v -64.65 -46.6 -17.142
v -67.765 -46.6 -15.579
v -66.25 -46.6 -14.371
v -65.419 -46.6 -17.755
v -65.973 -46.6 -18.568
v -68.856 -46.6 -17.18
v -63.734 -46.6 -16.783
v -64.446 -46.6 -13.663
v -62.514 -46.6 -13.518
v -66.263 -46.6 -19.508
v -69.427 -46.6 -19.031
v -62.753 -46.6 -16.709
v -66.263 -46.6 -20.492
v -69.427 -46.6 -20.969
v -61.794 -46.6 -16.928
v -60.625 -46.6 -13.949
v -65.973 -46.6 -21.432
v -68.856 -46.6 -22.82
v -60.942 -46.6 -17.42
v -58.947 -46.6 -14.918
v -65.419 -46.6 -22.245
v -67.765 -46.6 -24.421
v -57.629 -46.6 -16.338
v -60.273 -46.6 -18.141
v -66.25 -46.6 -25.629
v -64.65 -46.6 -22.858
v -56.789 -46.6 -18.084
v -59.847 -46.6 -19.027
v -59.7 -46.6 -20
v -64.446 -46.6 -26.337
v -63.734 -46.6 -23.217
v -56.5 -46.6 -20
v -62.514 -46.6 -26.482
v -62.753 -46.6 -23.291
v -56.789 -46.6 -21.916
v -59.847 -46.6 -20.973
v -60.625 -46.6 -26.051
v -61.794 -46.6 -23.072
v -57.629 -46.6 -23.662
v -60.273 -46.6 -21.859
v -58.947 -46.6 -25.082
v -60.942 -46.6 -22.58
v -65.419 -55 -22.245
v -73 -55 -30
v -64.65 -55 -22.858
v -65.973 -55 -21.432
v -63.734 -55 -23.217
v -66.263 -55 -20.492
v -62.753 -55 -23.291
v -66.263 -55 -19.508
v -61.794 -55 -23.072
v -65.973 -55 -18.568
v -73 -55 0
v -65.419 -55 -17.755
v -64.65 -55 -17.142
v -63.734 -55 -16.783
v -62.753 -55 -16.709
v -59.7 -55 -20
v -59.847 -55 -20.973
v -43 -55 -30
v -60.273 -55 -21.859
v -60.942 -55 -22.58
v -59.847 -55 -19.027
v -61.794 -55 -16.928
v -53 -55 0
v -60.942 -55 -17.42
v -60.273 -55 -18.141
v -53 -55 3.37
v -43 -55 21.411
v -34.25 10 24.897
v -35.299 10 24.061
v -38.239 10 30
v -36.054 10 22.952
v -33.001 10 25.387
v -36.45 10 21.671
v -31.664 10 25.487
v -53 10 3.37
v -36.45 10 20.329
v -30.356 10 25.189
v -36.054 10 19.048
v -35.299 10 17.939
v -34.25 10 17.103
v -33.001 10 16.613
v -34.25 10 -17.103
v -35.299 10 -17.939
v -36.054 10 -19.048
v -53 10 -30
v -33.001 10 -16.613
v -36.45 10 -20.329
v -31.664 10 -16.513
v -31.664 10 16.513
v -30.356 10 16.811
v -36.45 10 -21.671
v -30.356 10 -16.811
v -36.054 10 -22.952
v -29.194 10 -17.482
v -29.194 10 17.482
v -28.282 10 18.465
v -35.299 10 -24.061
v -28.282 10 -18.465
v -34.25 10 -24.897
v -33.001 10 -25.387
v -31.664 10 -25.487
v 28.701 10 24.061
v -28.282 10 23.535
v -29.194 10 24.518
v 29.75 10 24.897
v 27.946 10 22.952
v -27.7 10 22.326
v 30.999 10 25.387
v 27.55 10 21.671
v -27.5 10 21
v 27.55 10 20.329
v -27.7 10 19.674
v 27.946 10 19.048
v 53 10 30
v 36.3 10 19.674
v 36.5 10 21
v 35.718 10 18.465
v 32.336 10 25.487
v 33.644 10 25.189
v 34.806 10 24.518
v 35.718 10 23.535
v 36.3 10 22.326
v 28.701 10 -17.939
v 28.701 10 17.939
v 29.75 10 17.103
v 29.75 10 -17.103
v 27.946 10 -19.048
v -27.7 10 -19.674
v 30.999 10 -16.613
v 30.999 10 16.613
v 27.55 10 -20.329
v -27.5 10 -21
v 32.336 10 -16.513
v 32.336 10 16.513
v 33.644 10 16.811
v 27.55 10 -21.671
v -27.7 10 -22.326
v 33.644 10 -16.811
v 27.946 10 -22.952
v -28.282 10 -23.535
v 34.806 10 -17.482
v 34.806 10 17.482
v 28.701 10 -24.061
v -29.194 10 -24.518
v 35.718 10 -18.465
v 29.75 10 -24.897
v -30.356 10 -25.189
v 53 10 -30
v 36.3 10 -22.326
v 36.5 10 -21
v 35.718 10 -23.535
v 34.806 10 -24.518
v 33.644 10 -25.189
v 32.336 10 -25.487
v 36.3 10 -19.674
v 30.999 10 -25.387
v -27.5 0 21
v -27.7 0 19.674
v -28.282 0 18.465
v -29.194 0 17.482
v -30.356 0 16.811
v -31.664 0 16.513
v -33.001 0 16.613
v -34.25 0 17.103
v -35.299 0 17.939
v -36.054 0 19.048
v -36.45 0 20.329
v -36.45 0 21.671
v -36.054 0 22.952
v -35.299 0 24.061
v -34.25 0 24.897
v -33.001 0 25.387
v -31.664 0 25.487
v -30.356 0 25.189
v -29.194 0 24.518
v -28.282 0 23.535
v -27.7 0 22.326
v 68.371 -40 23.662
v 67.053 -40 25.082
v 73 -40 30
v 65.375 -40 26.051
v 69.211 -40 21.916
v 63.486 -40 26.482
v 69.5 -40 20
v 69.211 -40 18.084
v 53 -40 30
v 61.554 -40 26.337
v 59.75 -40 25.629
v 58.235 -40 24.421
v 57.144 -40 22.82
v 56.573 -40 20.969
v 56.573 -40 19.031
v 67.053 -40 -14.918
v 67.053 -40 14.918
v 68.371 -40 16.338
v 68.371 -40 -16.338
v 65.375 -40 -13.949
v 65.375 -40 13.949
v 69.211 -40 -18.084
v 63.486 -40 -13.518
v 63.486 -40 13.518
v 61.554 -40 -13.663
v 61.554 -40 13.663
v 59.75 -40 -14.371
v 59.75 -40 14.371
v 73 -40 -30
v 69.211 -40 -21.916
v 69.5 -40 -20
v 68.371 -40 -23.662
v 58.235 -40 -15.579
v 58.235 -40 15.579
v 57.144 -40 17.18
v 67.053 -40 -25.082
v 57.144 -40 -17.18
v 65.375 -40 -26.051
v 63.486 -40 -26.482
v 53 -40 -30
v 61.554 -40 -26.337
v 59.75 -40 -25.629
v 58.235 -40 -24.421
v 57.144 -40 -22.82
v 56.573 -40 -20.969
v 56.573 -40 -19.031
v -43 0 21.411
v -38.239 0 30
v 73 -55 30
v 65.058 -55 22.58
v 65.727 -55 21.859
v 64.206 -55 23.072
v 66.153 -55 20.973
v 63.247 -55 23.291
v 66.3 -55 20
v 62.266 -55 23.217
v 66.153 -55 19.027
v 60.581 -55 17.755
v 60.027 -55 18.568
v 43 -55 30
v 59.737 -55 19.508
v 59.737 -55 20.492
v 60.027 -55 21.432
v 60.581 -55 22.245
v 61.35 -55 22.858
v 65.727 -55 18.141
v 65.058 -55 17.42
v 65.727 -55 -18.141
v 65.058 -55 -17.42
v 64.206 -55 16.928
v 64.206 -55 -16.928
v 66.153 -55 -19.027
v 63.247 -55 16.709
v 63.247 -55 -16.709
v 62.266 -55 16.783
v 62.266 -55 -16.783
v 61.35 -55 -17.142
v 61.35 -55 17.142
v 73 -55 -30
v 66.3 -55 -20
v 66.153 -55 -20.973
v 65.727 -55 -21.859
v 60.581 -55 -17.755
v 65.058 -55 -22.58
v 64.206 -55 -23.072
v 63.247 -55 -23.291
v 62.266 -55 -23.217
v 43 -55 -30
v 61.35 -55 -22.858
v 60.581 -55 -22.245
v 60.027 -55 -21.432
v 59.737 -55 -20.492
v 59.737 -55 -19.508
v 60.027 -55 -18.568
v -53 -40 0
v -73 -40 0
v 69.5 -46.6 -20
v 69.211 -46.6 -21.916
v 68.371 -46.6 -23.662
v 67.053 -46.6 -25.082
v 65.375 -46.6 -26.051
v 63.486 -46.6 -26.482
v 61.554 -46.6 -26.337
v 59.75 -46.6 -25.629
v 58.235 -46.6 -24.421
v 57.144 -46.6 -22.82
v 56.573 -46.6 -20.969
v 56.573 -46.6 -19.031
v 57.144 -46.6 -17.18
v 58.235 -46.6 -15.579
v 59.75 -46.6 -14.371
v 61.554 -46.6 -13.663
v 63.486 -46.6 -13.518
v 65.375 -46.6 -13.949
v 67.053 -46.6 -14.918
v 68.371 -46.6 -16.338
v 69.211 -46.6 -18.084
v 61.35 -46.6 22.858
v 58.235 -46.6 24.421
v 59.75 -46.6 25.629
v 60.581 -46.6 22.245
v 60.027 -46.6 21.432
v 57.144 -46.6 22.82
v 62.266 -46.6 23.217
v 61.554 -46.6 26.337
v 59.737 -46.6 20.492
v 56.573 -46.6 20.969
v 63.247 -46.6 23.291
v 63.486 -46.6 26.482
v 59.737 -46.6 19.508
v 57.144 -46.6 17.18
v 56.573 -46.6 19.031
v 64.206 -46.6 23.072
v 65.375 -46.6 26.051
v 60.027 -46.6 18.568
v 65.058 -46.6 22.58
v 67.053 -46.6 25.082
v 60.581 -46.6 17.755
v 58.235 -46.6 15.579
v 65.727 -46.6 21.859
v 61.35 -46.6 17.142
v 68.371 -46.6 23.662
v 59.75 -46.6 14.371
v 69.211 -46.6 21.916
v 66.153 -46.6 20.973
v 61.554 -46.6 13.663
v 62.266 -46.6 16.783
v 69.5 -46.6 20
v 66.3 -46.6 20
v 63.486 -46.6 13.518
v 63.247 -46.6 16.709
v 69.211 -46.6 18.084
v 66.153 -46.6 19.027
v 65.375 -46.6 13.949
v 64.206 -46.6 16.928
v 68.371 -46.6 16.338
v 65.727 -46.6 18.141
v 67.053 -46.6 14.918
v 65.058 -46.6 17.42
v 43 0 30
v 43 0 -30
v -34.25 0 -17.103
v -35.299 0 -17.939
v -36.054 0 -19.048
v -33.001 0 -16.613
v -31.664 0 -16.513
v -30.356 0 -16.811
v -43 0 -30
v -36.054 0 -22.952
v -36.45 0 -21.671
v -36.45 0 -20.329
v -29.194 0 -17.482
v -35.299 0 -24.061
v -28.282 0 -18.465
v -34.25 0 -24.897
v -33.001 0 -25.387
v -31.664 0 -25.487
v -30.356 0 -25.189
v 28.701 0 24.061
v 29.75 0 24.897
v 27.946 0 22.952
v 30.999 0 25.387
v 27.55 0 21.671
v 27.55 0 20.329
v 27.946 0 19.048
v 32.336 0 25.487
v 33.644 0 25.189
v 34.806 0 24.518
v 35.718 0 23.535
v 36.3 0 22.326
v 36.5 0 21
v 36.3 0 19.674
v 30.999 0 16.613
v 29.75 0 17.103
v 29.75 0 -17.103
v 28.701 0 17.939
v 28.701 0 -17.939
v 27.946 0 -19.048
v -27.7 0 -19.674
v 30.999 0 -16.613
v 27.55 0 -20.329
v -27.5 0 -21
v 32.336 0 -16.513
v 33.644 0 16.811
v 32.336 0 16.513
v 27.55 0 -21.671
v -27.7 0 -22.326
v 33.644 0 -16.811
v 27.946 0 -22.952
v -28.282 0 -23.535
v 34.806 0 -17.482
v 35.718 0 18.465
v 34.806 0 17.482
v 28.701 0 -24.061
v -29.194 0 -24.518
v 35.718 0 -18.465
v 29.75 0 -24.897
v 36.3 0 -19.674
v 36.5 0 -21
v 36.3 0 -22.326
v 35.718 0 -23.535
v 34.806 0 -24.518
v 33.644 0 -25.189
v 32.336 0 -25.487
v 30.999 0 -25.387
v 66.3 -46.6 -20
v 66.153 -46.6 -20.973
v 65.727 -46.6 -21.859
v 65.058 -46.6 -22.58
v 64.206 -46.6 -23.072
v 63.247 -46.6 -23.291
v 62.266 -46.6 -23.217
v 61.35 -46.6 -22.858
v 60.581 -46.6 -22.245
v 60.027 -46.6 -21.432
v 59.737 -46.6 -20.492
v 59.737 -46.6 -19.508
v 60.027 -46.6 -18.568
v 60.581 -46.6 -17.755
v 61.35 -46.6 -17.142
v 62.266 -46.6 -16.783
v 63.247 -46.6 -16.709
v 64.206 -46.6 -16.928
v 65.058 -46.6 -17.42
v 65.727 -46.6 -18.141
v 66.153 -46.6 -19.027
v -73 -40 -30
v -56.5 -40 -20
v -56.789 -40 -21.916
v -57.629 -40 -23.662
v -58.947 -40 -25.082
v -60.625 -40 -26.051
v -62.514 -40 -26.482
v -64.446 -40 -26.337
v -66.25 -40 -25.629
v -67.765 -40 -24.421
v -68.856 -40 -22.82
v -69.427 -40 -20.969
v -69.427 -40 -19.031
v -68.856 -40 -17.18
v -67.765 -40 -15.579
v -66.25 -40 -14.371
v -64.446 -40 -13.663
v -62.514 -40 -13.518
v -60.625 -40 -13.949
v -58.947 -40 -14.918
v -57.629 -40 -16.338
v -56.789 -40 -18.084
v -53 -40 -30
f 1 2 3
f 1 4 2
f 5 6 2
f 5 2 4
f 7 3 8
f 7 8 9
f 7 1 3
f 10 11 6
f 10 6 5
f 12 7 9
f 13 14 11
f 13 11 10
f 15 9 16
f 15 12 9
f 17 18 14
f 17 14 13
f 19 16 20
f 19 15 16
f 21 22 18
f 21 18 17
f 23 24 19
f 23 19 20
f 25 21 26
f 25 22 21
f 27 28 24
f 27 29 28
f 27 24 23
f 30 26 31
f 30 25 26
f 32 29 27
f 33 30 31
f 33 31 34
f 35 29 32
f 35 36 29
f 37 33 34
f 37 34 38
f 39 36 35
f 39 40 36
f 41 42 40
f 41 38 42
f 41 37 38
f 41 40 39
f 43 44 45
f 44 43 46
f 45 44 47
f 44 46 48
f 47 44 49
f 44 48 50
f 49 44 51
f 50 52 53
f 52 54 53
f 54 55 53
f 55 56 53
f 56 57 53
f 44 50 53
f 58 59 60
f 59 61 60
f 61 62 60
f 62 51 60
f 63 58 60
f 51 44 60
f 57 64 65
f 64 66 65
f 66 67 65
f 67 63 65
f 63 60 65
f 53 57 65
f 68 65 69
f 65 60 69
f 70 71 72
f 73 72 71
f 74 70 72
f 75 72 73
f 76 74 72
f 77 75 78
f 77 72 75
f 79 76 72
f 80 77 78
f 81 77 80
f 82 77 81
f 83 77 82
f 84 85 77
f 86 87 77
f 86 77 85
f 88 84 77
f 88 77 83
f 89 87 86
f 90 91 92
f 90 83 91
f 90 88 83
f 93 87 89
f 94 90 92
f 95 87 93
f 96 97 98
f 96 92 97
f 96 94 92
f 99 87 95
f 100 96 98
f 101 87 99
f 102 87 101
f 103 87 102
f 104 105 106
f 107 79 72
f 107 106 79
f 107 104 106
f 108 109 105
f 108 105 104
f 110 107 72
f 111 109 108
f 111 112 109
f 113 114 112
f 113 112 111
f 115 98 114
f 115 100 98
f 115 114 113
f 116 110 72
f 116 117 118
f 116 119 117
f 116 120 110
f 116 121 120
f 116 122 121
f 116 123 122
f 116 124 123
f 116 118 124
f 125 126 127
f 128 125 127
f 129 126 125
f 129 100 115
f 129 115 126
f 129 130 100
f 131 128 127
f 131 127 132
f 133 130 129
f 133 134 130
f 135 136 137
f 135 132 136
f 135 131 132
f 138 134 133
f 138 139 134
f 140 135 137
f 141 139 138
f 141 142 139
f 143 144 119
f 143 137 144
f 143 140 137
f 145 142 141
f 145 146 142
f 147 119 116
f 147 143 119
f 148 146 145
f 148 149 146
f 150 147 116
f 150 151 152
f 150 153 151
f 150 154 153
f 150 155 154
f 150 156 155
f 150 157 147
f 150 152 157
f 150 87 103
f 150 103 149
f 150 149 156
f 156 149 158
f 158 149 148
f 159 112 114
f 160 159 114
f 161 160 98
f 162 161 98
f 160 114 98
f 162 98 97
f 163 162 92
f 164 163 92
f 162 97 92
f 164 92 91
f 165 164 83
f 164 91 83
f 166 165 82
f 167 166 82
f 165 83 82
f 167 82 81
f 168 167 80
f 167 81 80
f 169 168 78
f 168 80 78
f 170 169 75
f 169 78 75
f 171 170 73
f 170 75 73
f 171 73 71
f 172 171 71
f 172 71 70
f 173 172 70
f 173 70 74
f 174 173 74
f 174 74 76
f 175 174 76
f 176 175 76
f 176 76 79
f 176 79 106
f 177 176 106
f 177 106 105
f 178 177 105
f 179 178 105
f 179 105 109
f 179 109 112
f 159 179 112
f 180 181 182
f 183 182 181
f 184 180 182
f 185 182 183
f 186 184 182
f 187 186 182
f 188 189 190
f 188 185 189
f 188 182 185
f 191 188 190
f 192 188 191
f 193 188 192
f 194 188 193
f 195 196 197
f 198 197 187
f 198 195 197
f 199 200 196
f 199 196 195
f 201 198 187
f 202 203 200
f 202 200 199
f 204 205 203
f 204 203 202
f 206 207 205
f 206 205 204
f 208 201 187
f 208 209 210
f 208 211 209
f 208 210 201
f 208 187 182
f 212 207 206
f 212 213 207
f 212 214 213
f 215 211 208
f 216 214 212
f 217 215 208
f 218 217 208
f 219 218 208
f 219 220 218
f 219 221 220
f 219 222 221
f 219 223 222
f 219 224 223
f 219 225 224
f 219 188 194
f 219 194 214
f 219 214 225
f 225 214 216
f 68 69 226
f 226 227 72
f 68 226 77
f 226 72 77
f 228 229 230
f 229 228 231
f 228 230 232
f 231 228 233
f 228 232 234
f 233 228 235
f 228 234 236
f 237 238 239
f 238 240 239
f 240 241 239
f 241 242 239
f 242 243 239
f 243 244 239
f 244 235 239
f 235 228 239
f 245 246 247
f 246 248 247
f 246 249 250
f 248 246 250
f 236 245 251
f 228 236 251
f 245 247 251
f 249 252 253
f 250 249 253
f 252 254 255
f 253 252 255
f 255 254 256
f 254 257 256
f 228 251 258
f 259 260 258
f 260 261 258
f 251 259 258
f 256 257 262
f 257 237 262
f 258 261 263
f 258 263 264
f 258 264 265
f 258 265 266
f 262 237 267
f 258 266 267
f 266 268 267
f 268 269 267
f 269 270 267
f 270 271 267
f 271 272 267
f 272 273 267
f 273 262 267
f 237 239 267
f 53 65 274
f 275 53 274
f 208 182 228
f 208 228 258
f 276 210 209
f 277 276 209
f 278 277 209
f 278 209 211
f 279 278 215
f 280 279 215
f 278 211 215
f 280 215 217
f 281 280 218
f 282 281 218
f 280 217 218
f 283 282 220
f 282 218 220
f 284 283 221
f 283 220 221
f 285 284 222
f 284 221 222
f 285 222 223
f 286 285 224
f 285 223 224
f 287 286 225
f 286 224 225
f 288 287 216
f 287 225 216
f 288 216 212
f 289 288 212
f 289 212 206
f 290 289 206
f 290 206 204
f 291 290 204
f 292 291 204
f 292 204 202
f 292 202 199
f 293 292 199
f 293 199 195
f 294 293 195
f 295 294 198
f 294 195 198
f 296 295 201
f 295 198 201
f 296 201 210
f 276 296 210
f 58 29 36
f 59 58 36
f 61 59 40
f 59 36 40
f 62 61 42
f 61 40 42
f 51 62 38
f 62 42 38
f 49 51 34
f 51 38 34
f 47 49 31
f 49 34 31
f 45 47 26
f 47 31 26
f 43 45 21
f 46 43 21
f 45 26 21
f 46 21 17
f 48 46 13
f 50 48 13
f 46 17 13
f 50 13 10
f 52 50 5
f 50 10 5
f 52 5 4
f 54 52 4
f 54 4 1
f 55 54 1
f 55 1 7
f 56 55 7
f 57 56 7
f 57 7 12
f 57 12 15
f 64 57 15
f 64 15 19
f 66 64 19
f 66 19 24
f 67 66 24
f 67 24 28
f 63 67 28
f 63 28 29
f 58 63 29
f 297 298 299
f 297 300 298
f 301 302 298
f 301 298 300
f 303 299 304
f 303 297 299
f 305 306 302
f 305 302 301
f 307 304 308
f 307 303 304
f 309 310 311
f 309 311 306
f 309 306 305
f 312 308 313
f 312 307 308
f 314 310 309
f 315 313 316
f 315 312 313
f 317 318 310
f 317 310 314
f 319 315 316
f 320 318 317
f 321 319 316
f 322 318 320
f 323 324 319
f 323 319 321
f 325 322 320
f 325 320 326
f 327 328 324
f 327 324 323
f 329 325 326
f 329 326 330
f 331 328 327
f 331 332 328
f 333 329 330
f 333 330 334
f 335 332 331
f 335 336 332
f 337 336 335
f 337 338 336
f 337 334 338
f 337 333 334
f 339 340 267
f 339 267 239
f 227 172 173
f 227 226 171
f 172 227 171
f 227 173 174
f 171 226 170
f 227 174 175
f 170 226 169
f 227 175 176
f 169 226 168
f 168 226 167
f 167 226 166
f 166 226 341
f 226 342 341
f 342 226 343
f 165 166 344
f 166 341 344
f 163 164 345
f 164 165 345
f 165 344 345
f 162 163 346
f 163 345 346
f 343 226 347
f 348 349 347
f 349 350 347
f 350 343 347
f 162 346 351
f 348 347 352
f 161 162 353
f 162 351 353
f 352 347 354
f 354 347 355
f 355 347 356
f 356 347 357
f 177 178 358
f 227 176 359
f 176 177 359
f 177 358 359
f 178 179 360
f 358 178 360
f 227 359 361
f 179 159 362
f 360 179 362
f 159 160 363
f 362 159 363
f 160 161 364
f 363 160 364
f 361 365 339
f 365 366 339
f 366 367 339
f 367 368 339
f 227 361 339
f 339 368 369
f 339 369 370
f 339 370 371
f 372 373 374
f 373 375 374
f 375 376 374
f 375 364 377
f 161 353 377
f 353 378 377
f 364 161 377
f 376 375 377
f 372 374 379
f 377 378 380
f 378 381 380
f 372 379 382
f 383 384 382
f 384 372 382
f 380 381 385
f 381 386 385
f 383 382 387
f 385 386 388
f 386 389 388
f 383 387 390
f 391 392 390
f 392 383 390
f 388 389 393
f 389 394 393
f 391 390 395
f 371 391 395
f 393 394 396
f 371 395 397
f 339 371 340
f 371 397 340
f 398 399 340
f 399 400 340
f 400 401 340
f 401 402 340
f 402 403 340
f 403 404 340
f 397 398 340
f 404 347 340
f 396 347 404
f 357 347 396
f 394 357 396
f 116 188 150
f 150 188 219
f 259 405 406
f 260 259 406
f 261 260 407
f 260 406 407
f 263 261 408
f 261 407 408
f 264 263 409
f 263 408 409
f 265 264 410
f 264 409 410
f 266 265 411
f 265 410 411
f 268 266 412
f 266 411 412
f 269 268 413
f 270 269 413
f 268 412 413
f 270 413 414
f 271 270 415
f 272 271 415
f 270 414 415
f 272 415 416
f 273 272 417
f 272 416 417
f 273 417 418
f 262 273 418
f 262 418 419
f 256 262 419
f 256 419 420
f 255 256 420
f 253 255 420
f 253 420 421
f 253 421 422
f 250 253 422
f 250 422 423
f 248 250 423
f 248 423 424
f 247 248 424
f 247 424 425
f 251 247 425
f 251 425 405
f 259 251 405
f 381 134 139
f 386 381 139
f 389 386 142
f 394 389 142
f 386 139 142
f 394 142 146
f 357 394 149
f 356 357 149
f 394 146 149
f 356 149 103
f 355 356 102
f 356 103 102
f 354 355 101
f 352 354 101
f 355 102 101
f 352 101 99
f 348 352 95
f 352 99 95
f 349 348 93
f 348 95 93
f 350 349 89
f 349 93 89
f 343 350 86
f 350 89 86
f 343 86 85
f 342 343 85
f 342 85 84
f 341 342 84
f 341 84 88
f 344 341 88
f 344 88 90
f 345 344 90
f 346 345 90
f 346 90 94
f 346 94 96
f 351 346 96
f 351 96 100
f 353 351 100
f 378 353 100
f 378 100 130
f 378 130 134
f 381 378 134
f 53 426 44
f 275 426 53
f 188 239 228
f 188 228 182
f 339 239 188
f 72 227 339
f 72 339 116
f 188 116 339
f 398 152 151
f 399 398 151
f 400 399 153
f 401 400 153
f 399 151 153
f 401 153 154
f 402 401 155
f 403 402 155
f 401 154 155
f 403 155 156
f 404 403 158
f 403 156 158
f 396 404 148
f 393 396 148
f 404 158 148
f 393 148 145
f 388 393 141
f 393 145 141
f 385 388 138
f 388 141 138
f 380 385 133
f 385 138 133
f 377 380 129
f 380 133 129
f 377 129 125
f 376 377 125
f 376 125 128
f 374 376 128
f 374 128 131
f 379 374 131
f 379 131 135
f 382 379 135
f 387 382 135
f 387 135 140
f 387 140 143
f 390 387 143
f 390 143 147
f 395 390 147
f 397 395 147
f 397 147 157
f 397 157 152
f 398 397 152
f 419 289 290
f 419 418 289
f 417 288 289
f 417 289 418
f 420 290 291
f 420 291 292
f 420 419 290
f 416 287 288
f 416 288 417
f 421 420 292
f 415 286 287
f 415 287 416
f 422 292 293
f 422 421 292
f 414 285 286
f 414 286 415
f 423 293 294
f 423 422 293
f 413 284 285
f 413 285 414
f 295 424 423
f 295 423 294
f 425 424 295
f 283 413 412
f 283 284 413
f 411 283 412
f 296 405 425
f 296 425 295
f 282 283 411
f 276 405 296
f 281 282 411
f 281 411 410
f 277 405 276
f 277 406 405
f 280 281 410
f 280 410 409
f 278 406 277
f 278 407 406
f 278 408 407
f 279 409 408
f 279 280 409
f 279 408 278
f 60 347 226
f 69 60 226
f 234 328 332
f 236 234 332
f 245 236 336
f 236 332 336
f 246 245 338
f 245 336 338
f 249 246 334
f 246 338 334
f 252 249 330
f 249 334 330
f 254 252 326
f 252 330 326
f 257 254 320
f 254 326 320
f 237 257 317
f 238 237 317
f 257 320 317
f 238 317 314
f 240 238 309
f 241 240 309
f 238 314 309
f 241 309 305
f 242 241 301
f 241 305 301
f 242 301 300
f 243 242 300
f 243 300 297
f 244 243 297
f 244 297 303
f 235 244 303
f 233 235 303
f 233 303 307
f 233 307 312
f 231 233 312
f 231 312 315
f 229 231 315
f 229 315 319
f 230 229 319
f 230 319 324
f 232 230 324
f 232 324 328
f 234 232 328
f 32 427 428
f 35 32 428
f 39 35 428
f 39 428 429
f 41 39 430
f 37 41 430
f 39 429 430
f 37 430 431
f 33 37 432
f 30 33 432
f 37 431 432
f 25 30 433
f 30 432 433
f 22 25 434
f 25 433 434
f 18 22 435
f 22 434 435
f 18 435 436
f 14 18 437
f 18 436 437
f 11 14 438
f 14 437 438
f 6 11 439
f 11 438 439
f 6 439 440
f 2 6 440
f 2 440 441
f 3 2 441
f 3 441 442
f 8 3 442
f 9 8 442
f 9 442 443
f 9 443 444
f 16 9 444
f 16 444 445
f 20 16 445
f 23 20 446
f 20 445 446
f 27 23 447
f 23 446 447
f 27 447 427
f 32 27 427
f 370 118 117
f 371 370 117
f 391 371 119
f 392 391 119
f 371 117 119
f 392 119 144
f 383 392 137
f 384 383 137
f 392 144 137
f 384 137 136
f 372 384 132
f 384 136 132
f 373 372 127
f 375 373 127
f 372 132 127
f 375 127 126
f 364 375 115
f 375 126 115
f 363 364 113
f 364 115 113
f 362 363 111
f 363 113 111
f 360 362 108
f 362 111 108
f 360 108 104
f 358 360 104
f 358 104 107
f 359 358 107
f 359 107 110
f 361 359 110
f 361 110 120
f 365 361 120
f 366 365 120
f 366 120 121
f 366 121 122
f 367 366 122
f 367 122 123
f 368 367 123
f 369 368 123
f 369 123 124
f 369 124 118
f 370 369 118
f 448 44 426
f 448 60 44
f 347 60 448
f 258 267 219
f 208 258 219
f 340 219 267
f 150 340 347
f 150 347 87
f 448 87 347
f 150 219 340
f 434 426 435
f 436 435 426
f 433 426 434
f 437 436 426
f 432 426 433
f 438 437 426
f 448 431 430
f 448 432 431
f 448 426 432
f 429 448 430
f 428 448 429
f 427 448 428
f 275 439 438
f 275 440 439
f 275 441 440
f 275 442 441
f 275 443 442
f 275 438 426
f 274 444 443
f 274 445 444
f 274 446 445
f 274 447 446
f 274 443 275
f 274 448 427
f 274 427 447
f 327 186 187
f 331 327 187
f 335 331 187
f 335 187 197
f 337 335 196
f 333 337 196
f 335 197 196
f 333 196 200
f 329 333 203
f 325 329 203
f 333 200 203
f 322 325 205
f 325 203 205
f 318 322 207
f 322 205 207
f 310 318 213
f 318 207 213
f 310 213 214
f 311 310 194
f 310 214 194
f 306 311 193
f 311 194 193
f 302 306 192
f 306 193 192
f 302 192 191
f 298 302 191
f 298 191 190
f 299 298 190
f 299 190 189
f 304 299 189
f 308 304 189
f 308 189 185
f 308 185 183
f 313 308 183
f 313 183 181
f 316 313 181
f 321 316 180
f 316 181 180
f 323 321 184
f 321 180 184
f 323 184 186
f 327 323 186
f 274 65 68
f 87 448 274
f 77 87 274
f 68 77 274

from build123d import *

# Parameters (mm, degrees)
SKETCH1_W           = 106
SKETCH1_H           = 60
BOSS_EXTRUDE1_DEPTH = 10
SKETCH2_W           = 10
SKETCH2_H           = 60
BOSS_EXTRUDE2_DEPTH = 55
SKETCH3_W           = 60
SKETCH3_H           = 15
BOSS_EXTRUDE3_DEPTH = 20
SKETCH4_W           = 30
SKETCH4_H           = 15
BOSS_EXTRUDE4_DEPTH = 20
SKETCH5_R           = 4.5
CUT_EXTRUDE1_DEPTH  = 66
SKETCH6_R           = 6.5
CUT_EXTRUDE2_DEPTH  = 6.6
SKETCH7_R           = 3.3
CUT_EXTRUDE3_DEPTH  = 9.4
CUT_EXTRUDE4_DEPTH  = 66


with BuildPart() as part:
    # Sketch1 → Boss-Extrude1 (new body)
    with BuildSketch(Plane(origin=(0, 0, 0), x_dir=(1, 0, 0), z_dir=(0, 1, 0))):
        Rectangle(SKETCH1_W, SKETCH1_H)
    extrude(amount=BOSS_EXTRUDE1_DEPTH)

    # Sketch2 → Boss-Extrude2 (add)
    with BuildSketch(Plane.XZ):
        with Locations((-48, 0)):
            Rectangle(SKETCH2_W, SKETCH2_H)
        with Locations((48, 0)):
            Rectangle(SKETCH2_W, SKETCH2_H)
    extrude(amount=BOSS_EXTRUDE2_DEPTH)

    # Sketch3 → Boss-Extrude3 (add)
    with BuildSketch(Plane(origin=(53, 0, 0), x_dir=(0, 0, -1), z_dir=(1, 0, 0))):
        with Locations((0, -47.5)):
            Rectangle(SKETCH3_W, SKETCH3_H)
    extrude(amount=BOSS_EXTRUDE3_DEPTH)

    # Sketch4 → Boss-Extrude4 (add)
    with BuildSketch(Plane.ZY.offset(53)):
        with Locations((-15, -47.5)):
            Rectangle(SKETCH4_W, SKETCH4_H)
    extrude(amount=BOSS_EXTRUDE4_DEPTH)

    # Sketch5 → Cut-Extrude1 (cut, through all)
    with BuildSketch(Plane(origin=(0, 10, 0), x_dir=(1, 0, 0), z_dir=(0, 1, 0))):
        with Locations((-32, 21)):
            Circle(SKETCH5_R)
        with Locations((32, 21)):
            Circle(SKETCH5_R)
        with Locations((32, -21)):
            Circle(SKETCH5_R)
        with Locations((-32, -21)):
            Circle(SKETCH5_R)
    extrude(amount=-CUT_EXTRUDE1_DEPTH, mode=Mode.SUBTRACT)

    # Sketch6 → Cut-Extrude2 (cut)
    with BuildSketch(Plane(origin=(0, -40, 0), x_dir=(1, 0, 0), z_dir=(0, 1, 0))):
        with Locations((63, 20)):
            Circle(SKETCH6_R)
        with Locations((63, -20)):
            Circle(SKETCH6_R)
        with Locations((-63, 20)):
            Circle(SKETCH6_R)
    extrude(amount=-CUT_EXTRUDE2_DEPTH, mode=Mode.SUBTRACT)

    # Sketch7 → Cut-Extrude3 (cut, through all)
    with BuildSketch(Plane(origin=(0, -46.6, 0), x_dir=(1, 0, 0), z_dir=(0, 1, 0))):
        with Locations((-63, 20)):
            Circle(SKETCH7_R)
        with Locations((63, -20)):
            Circle(SKETCH7_R)
        with Locations((63, 20)):
            Circle(SKETCH7_R)
    extrude(amount=-CUT_EXTRUDE3_DEPTH, mode=Mode.SUBTRACT)

    # Sketch8 → Cut-Extrude4 (cut, through all)
    with BuildSketch(Plane(origin=(0, 10, 0), x_dir=(1, 0, 0), z_dir=(0, 1, 0))):
        Polygon((-38.239, -30), (-53, -3.370451084), (-53, -30), align=None)
    extrude(amount=-CUT_EXTRUDE4_DEPTH, mode=Mode.SUBTRACT)


solid = part.part
